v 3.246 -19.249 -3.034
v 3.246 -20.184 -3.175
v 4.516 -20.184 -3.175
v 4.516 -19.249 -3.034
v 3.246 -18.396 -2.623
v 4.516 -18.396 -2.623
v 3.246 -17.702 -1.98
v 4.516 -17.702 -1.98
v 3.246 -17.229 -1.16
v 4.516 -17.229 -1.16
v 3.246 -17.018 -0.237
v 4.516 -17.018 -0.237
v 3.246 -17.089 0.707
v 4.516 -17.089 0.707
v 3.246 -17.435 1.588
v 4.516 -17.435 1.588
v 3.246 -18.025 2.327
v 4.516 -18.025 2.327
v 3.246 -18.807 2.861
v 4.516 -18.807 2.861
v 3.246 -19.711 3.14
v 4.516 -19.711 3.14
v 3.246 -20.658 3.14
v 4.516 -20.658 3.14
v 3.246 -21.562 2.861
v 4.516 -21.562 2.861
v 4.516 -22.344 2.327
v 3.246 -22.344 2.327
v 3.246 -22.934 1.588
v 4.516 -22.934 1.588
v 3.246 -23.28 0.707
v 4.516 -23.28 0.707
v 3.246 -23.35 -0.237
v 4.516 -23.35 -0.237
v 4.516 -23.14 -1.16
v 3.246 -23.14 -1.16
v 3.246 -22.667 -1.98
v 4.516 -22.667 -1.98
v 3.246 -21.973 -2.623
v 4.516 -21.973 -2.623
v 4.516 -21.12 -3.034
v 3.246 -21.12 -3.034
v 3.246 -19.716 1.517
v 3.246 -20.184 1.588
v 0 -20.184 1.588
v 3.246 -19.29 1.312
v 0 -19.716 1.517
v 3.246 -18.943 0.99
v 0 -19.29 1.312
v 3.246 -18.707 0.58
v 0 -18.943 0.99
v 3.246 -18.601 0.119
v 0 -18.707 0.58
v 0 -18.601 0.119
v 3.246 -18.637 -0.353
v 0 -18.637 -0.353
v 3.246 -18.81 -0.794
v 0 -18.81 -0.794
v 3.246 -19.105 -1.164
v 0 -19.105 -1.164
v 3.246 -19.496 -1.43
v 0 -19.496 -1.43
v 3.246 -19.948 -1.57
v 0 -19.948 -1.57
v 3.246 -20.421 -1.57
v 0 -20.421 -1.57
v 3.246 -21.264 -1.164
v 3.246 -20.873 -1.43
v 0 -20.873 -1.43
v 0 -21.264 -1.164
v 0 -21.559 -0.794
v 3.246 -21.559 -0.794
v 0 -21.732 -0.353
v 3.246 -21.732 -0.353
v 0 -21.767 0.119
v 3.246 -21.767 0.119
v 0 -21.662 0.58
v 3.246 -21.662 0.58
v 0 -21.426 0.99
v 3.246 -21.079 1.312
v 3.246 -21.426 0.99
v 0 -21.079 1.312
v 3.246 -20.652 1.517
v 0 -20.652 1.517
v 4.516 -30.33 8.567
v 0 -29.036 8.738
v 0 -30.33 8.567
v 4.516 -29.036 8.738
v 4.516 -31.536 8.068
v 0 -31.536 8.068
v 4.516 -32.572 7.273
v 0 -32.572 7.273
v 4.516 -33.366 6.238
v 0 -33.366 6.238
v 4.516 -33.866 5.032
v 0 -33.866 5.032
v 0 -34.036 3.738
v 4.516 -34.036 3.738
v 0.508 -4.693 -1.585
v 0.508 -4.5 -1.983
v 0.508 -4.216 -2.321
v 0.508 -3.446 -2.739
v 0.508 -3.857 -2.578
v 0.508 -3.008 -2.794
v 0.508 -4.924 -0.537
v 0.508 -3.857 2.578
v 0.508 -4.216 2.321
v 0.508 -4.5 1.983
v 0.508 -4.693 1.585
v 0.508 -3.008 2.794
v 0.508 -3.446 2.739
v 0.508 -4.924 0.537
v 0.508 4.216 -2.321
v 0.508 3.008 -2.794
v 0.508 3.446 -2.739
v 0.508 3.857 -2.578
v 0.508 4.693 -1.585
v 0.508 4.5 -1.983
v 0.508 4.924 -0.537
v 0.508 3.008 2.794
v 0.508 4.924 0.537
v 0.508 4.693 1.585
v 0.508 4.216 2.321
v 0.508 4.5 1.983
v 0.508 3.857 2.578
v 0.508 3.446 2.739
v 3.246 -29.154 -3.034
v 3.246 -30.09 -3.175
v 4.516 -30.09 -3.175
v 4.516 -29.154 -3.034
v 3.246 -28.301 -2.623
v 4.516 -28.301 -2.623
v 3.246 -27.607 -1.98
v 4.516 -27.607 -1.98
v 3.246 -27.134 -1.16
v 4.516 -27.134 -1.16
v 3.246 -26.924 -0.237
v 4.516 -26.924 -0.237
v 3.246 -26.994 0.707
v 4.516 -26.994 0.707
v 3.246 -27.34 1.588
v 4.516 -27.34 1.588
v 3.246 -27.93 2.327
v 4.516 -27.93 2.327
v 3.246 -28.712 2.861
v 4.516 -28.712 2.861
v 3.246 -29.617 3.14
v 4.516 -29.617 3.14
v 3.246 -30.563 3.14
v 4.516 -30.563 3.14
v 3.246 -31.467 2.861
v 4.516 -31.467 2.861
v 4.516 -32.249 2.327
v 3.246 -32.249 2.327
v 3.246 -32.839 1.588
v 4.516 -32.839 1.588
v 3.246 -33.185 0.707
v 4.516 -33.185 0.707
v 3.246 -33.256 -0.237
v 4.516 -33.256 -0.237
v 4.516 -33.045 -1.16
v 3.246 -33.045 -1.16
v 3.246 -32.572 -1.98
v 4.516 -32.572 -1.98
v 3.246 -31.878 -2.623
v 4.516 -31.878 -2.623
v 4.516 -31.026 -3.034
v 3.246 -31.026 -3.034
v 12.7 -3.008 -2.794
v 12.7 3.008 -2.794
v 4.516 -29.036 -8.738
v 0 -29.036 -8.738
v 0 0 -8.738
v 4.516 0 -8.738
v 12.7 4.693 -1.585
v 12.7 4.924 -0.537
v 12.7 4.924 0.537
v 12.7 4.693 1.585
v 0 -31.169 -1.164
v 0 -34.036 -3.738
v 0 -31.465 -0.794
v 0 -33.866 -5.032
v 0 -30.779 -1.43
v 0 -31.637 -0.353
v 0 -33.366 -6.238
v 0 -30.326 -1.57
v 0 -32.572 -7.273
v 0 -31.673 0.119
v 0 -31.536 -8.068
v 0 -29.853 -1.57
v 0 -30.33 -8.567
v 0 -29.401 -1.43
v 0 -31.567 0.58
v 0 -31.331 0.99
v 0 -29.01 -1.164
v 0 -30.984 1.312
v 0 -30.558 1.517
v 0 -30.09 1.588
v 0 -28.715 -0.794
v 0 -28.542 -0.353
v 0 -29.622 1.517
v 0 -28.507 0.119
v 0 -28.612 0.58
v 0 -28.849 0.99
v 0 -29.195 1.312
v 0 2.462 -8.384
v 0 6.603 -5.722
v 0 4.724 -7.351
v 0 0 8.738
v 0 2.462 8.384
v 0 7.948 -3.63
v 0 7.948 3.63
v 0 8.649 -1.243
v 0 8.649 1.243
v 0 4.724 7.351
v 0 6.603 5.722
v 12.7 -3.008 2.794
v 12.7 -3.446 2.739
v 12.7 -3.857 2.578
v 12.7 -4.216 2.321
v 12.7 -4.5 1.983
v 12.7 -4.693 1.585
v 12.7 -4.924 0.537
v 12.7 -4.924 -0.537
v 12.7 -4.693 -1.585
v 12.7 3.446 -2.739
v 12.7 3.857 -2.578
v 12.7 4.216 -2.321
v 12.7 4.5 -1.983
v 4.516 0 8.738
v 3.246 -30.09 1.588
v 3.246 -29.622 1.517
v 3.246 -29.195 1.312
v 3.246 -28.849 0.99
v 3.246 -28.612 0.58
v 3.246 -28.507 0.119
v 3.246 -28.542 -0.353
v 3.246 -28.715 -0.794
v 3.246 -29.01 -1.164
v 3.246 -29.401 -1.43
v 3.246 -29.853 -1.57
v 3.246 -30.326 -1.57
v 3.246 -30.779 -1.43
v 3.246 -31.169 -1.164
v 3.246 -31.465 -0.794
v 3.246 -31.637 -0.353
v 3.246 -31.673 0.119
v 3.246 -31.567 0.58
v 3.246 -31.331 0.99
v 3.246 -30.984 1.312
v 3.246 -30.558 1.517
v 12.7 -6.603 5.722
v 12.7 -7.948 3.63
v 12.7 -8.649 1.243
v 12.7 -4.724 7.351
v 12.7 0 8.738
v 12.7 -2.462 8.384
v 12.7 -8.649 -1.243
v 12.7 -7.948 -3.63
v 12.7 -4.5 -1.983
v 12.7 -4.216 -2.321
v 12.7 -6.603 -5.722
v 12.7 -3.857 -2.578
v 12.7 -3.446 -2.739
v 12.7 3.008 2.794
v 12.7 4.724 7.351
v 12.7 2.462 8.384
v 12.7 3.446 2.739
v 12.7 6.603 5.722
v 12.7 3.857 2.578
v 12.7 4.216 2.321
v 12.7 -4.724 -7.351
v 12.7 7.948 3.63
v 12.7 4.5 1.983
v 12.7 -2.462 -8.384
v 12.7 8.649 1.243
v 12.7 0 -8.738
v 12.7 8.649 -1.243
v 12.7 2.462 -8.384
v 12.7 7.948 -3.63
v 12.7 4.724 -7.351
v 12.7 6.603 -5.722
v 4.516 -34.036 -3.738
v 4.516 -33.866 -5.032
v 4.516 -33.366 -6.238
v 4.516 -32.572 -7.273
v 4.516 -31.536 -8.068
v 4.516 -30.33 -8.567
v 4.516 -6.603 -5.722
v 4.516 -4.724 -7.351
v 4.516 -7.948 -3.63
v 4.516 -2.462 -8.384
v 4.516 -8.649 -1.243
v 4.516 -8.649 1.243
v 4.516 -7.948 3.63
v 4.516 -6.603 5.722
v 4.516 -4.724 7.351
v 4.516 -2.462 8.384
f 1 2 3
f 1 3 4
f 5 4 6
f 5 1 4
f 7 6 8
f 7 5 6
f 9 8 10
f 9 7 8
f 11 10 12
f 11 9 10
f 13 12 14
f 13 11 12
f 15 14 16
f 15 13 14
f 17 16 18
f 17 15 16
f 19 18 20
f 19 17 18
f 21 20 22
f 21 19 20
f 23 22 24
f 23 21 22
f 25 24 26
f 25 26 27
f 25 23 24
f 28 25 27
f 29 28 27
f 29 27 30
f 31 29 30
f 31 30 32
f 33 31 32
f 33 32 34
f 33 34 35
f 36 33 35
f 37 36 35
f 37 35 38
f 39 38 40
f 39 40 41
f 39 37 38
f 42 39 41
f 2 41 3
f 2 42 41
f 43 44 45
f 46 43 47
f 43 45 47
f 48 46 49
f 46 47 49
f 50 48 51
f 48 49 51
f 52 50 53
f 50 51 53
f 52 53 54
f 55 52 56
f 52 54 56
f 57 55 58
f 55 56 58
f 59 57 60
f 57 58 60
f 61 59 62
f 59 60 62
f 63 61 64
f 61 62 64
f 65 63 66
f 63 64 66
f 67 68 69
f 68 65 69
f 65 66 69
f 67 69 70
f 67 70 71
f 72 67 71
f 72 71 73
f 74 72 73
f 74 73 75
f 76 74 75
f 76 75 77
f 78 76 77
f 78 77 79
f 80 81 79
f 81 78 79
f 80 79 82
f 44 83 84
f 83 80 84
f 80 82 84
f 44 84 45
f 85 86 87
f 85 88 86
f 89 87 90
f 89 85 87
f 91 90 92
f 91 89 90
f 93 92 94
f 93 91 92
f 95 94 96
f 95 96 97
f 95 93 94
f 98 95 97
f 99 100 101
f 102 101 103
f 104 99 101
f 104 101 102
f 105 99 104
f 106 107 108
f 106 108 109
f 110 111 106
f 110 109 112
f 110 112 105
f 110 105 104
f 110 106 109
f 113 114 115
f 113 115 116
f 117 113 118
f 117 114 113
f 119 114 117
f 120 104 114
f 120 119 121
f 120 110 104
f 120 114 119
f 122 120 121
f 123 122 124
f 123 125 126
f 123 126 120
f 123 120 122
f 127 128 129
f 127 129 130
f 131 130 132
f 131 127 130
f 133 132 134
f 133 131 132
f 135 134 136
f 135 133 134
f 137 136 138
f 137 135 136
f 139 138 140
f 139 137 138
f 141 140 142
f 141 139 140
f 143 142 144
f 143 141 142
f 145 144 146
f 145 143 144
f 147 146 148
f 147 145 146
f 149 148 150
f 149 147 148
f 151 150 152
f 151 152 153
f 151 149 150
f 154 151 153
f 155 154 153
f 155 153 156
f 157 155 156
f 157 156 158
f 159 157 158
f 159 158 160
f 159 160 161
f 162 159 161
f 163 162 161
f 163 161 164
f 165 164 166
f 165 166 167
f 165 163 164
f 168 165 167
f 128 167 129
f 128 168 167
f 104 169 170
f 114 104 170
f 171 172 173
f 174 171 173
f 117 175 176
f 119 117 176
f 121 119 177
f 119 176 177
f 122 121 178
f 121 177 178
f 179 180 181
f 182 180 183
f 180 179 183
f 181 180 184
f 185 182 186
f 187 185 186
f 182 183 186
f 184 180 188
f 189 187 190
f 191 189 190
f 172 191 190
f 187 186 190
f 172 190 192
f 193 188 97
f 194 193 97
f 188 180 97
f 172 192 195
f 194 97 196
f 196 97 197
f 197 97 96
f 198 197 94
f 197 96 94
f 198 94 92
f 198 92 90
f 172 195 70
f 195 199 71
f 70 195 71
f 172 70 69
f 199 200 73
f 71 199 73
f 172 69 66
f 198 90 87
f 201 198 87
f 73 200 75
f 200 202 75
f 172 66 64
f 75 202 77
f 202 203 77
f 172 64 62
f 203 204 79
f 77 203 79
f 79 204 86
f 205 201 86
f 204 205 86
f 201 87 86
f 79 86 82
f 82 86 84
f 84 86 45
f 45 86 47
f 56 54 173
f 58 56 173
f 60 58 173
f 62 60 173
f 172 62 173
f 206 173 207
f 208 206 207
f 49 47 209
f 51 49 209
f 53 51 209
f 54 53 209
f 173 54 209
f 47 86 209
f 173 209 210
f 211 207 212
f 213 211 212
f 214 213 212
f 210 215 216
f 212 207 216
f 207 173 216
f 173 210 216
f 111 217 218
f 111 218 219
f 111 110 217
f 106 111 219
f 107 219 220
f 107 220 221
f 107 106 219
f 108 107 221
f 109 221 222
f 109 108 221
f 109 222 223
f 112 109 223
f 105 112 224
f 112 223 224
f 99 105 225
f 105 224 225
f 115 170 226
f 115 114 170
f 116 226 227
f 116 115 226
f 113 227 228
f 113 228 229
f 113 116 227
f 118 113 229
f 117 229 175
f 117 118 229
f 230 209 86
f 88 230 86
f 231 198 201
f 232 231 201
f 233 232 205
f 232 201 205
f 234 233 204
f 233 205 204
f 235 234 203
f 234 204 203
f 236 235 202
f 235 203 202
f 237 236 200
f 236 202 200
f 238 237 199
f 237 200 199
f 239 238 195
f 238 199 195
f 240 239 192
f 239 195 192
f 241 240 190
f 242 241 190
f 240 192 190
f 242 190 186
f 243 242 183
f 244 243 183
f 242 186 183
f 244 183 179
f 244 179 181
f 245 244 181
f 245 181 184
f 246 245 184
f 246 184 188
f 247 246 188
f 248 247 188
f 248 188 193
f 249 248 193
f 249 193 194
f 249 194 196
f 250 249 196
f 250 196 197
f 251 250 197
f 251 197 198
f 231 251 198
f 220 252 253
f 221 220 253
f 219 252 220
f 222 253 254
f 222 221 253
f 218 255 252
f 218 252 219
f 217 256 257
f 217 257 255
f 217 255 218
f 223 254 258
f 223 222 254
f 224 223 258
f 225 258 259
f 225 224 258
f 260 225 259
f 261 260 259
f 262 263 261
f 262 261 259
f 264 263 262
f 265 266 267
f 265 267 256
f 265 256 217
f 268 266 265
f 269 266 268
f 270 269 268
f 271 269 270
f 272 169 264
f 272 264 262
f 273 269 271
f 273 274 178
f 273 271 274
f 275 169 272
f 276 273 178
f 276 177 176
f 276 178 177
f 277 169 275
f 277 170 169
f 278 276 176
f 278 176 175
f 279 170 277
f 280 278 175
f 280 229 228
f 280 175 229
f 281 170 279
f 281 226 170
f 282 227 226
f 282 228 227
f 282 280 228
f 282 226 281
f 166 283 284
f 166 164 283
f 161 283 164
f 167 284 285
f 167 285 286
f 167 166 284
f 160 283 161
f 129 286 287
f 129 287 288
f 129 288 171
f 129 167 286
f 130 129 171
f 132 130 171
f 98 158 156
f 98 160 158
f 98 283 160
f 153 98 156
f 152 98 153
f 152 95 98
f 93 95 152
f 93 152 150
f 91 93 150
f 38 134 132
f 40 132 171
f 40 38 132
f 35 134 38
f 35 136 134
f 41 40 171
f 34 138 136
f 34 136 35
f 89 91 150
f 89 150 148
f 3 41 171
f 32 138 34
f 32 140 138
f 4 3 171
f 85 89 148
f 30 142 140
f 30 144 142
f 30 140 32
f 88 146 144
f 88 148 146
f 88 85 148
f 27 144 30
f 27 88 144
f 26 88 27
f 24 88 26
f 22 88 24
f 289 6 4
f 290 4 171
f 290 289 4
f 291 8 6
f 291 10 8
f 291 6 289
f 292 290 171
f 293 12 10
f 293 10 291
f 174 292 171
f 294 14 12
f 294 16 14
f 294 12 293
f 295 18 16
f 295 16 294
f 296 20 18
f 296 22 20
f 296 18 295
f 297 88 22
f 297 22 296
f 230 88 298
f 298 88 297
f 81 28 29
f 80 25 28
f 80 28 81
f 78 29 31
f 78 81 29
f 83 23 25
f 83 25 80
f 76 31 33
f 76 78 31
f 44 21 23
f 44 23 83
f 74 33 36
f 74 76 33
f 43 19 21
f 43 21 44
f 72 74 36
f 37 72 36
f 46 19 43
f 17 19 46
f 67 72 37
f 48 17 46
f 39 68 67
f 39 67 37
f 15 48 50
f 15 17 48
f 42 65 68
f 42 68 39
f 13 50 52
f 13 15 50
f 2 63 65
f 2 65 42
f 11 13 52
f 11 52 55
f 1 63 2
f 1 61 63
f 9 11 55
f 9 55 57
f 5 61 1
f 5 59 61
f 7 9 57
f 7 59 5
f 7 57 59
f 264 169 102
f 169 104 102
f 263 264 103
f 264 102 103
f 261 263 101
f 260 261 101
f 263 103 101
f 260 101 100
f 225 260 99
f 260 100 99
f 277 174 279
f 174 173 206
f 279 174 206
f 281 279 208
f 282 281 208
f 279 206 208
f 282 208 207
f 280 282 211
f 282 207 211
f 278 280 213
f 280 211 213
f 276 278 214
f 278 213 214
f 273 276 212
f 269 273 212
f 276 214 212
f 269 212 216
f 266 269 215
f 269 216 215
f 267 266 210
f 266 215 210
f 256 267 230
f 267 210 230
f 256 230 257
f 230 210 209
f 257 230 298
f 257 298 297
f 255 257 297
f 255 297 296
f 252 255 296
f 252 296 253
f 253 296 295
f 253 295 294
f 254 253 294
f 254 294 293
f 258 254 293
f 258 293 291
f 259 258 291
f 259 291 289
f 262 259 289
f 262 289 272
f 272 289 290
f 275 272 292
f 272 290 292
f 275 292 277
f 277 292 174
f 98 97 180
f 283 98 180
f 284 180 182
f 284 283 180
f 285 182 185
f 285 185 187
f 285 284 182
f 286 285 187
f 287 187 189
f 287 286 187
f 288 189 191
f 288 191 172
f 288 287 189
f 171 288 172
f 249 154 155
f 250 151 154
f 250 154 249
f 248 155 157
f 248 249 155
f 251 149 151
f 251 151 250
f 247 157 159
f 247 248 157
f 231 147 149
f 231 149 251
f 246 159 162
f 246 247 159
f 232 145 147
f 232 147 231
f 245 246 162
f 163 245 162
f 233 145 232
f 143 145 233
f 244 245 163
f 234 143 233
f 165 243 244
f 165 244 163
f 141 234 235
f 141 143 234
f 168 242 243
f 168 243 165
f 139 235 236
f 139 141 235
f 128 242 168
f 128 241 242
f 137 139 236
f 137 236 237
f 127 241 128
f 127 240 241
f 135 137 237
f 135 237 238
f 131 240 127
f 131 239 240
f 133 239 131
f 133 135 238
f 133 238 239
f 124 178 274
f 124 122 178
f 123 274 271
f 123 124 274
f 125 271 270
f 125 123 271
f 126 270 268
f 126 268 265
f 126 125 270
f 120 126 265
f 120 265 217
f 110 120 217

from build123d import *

# Parameters (mm, degrees)
SKETCH1_R           = 8.7376
BOSS_EXTRUDE1_DEPTH = 12.7
BOSS_EXTRUDE3_DEPTH = 4.516000112
FILLET2_R           = 5
CUT_EXTRUDE10_DEPTH = 12.192
SKETCH23_R          = 1.5875
CUT_EXTRUDE11_DEPTH = 38.364220181
CUT_EXTRUDE13_START = -1.27
SKETCH24_R          = 3.175
SKETCH24_R_2        = 1.5875
CUT_EXTRUDE13_DEPTH = 1.27
FILLET11_R          = 1.778


with BuildPart() as part:
    # Sketch1 → Boss-Extrude1 (new body)
    with BuildSketch(Plane.YZ):
        Circle(SKETCH1_R)
    extrude(amount=BOSS_EXTRUDE1_DEPTH)

    # Sketch10 → Boss-Extrude3 (add)
    with BuildSketch(Plane(origin=(0, 0, 0), x_dir=(0, -1, 0), z_dir=(-1, 0, 0))):
        with BuildLine():
            Line((34.036, 8.7376), (0, 8.7376))
            ThreePointArc((0, 8.7376), (8.7376, 0), (0, -8.7376))
            Line((0, -8.7376), (34.036, -8.7376))
            Line((34.036, -8.7376), (34.036, 8.7376))
        make_face()
    extrude(amount=-BOSS_EXTRUDE3_DEPTH)

    # Fillet2
    fillet2_edges = [part.edges().sort_by_distance(p)[0] for p in [
        (2.258000056, -34.036, 8.7376),
        (2.258000056, -34.036, -8.7376),
    ]]
    fillet(fillet2_edges, radius=FILLET2_R)

    # Sketch22 → Cut-Extrude10 (cut)
    with BuildSketch(Plane.YZ.offset(12.7)):
        with BuildLine():
            Line((-4.089715516, -2.794), (4.089715516, -2.794))
            ThreePointArc((4.089715516, -2.794), (4.953, 0), (4.089715516, 2.794))
            Line((4.089715516, 2.794), (-4.089715516, 2.794))
            ThreePointArc((-4.089715516, 2.794), (-4.953, 0), (-4.089715516, -2.794))
        make_face()
    extrude(amount=-CUT_EXTRUDE10_DEPTH, mode=Mode.SUBTRACT)

    # Sketch23 → Cut-Extrude11 (cut, through all)
    with BuildSketch(Plane.ZY):
        with Locations((0, -30.089710358)):
            Circle(SKETCH23_R)
        with Locations((0, -20.184348406)):
            Circle(SKETCH23_R)
    extrude(amount=-CUT_EXTRUDE11_DEPTH, mode=Mode.SUBTRACT)

    # Sketch24 → Cut-Extrude13 (cut)
    # profile 1 of 2: a face of its own
    with BuildSketch(Plane.YZ.offset(4.516000112).offset(CUT_EXTRUDE13_START)):
        with Locations((-20.184348406, 0)):
            Circle(SKETCH24_R)
        with Locations((-20.184348406, 0)):
            Circle(SKETCH24_R_2, mode=Mode.SUBTRACT)
    # profile 2 of 2: a face of its own
    with BuildSketch(Plane.YZ.offset(4.516000112).offset(CUT_EXTRUDE13_START)):
        with Locations((-30.089710358, 0)):
            Circle(SKETCH24_R)
    extrude(amount=CUT_EXTRUDE13_DEPTH, mode=Mode.SUBTRACT)

    # Fillet11
    fillet11_edges = [part.edges().sort_by_distance(p)[0] for p in [
        (6.604, 4.089715516, -2.794),
        (6.604, 4.089715516, 2.794),
        (6.604, -4.089715516, -2.794),
        (6.604, -4.089715516, 2.794),
    ]]
    fillet(fillet11_edges, radius=FILLET11_R)


solid = part.part
